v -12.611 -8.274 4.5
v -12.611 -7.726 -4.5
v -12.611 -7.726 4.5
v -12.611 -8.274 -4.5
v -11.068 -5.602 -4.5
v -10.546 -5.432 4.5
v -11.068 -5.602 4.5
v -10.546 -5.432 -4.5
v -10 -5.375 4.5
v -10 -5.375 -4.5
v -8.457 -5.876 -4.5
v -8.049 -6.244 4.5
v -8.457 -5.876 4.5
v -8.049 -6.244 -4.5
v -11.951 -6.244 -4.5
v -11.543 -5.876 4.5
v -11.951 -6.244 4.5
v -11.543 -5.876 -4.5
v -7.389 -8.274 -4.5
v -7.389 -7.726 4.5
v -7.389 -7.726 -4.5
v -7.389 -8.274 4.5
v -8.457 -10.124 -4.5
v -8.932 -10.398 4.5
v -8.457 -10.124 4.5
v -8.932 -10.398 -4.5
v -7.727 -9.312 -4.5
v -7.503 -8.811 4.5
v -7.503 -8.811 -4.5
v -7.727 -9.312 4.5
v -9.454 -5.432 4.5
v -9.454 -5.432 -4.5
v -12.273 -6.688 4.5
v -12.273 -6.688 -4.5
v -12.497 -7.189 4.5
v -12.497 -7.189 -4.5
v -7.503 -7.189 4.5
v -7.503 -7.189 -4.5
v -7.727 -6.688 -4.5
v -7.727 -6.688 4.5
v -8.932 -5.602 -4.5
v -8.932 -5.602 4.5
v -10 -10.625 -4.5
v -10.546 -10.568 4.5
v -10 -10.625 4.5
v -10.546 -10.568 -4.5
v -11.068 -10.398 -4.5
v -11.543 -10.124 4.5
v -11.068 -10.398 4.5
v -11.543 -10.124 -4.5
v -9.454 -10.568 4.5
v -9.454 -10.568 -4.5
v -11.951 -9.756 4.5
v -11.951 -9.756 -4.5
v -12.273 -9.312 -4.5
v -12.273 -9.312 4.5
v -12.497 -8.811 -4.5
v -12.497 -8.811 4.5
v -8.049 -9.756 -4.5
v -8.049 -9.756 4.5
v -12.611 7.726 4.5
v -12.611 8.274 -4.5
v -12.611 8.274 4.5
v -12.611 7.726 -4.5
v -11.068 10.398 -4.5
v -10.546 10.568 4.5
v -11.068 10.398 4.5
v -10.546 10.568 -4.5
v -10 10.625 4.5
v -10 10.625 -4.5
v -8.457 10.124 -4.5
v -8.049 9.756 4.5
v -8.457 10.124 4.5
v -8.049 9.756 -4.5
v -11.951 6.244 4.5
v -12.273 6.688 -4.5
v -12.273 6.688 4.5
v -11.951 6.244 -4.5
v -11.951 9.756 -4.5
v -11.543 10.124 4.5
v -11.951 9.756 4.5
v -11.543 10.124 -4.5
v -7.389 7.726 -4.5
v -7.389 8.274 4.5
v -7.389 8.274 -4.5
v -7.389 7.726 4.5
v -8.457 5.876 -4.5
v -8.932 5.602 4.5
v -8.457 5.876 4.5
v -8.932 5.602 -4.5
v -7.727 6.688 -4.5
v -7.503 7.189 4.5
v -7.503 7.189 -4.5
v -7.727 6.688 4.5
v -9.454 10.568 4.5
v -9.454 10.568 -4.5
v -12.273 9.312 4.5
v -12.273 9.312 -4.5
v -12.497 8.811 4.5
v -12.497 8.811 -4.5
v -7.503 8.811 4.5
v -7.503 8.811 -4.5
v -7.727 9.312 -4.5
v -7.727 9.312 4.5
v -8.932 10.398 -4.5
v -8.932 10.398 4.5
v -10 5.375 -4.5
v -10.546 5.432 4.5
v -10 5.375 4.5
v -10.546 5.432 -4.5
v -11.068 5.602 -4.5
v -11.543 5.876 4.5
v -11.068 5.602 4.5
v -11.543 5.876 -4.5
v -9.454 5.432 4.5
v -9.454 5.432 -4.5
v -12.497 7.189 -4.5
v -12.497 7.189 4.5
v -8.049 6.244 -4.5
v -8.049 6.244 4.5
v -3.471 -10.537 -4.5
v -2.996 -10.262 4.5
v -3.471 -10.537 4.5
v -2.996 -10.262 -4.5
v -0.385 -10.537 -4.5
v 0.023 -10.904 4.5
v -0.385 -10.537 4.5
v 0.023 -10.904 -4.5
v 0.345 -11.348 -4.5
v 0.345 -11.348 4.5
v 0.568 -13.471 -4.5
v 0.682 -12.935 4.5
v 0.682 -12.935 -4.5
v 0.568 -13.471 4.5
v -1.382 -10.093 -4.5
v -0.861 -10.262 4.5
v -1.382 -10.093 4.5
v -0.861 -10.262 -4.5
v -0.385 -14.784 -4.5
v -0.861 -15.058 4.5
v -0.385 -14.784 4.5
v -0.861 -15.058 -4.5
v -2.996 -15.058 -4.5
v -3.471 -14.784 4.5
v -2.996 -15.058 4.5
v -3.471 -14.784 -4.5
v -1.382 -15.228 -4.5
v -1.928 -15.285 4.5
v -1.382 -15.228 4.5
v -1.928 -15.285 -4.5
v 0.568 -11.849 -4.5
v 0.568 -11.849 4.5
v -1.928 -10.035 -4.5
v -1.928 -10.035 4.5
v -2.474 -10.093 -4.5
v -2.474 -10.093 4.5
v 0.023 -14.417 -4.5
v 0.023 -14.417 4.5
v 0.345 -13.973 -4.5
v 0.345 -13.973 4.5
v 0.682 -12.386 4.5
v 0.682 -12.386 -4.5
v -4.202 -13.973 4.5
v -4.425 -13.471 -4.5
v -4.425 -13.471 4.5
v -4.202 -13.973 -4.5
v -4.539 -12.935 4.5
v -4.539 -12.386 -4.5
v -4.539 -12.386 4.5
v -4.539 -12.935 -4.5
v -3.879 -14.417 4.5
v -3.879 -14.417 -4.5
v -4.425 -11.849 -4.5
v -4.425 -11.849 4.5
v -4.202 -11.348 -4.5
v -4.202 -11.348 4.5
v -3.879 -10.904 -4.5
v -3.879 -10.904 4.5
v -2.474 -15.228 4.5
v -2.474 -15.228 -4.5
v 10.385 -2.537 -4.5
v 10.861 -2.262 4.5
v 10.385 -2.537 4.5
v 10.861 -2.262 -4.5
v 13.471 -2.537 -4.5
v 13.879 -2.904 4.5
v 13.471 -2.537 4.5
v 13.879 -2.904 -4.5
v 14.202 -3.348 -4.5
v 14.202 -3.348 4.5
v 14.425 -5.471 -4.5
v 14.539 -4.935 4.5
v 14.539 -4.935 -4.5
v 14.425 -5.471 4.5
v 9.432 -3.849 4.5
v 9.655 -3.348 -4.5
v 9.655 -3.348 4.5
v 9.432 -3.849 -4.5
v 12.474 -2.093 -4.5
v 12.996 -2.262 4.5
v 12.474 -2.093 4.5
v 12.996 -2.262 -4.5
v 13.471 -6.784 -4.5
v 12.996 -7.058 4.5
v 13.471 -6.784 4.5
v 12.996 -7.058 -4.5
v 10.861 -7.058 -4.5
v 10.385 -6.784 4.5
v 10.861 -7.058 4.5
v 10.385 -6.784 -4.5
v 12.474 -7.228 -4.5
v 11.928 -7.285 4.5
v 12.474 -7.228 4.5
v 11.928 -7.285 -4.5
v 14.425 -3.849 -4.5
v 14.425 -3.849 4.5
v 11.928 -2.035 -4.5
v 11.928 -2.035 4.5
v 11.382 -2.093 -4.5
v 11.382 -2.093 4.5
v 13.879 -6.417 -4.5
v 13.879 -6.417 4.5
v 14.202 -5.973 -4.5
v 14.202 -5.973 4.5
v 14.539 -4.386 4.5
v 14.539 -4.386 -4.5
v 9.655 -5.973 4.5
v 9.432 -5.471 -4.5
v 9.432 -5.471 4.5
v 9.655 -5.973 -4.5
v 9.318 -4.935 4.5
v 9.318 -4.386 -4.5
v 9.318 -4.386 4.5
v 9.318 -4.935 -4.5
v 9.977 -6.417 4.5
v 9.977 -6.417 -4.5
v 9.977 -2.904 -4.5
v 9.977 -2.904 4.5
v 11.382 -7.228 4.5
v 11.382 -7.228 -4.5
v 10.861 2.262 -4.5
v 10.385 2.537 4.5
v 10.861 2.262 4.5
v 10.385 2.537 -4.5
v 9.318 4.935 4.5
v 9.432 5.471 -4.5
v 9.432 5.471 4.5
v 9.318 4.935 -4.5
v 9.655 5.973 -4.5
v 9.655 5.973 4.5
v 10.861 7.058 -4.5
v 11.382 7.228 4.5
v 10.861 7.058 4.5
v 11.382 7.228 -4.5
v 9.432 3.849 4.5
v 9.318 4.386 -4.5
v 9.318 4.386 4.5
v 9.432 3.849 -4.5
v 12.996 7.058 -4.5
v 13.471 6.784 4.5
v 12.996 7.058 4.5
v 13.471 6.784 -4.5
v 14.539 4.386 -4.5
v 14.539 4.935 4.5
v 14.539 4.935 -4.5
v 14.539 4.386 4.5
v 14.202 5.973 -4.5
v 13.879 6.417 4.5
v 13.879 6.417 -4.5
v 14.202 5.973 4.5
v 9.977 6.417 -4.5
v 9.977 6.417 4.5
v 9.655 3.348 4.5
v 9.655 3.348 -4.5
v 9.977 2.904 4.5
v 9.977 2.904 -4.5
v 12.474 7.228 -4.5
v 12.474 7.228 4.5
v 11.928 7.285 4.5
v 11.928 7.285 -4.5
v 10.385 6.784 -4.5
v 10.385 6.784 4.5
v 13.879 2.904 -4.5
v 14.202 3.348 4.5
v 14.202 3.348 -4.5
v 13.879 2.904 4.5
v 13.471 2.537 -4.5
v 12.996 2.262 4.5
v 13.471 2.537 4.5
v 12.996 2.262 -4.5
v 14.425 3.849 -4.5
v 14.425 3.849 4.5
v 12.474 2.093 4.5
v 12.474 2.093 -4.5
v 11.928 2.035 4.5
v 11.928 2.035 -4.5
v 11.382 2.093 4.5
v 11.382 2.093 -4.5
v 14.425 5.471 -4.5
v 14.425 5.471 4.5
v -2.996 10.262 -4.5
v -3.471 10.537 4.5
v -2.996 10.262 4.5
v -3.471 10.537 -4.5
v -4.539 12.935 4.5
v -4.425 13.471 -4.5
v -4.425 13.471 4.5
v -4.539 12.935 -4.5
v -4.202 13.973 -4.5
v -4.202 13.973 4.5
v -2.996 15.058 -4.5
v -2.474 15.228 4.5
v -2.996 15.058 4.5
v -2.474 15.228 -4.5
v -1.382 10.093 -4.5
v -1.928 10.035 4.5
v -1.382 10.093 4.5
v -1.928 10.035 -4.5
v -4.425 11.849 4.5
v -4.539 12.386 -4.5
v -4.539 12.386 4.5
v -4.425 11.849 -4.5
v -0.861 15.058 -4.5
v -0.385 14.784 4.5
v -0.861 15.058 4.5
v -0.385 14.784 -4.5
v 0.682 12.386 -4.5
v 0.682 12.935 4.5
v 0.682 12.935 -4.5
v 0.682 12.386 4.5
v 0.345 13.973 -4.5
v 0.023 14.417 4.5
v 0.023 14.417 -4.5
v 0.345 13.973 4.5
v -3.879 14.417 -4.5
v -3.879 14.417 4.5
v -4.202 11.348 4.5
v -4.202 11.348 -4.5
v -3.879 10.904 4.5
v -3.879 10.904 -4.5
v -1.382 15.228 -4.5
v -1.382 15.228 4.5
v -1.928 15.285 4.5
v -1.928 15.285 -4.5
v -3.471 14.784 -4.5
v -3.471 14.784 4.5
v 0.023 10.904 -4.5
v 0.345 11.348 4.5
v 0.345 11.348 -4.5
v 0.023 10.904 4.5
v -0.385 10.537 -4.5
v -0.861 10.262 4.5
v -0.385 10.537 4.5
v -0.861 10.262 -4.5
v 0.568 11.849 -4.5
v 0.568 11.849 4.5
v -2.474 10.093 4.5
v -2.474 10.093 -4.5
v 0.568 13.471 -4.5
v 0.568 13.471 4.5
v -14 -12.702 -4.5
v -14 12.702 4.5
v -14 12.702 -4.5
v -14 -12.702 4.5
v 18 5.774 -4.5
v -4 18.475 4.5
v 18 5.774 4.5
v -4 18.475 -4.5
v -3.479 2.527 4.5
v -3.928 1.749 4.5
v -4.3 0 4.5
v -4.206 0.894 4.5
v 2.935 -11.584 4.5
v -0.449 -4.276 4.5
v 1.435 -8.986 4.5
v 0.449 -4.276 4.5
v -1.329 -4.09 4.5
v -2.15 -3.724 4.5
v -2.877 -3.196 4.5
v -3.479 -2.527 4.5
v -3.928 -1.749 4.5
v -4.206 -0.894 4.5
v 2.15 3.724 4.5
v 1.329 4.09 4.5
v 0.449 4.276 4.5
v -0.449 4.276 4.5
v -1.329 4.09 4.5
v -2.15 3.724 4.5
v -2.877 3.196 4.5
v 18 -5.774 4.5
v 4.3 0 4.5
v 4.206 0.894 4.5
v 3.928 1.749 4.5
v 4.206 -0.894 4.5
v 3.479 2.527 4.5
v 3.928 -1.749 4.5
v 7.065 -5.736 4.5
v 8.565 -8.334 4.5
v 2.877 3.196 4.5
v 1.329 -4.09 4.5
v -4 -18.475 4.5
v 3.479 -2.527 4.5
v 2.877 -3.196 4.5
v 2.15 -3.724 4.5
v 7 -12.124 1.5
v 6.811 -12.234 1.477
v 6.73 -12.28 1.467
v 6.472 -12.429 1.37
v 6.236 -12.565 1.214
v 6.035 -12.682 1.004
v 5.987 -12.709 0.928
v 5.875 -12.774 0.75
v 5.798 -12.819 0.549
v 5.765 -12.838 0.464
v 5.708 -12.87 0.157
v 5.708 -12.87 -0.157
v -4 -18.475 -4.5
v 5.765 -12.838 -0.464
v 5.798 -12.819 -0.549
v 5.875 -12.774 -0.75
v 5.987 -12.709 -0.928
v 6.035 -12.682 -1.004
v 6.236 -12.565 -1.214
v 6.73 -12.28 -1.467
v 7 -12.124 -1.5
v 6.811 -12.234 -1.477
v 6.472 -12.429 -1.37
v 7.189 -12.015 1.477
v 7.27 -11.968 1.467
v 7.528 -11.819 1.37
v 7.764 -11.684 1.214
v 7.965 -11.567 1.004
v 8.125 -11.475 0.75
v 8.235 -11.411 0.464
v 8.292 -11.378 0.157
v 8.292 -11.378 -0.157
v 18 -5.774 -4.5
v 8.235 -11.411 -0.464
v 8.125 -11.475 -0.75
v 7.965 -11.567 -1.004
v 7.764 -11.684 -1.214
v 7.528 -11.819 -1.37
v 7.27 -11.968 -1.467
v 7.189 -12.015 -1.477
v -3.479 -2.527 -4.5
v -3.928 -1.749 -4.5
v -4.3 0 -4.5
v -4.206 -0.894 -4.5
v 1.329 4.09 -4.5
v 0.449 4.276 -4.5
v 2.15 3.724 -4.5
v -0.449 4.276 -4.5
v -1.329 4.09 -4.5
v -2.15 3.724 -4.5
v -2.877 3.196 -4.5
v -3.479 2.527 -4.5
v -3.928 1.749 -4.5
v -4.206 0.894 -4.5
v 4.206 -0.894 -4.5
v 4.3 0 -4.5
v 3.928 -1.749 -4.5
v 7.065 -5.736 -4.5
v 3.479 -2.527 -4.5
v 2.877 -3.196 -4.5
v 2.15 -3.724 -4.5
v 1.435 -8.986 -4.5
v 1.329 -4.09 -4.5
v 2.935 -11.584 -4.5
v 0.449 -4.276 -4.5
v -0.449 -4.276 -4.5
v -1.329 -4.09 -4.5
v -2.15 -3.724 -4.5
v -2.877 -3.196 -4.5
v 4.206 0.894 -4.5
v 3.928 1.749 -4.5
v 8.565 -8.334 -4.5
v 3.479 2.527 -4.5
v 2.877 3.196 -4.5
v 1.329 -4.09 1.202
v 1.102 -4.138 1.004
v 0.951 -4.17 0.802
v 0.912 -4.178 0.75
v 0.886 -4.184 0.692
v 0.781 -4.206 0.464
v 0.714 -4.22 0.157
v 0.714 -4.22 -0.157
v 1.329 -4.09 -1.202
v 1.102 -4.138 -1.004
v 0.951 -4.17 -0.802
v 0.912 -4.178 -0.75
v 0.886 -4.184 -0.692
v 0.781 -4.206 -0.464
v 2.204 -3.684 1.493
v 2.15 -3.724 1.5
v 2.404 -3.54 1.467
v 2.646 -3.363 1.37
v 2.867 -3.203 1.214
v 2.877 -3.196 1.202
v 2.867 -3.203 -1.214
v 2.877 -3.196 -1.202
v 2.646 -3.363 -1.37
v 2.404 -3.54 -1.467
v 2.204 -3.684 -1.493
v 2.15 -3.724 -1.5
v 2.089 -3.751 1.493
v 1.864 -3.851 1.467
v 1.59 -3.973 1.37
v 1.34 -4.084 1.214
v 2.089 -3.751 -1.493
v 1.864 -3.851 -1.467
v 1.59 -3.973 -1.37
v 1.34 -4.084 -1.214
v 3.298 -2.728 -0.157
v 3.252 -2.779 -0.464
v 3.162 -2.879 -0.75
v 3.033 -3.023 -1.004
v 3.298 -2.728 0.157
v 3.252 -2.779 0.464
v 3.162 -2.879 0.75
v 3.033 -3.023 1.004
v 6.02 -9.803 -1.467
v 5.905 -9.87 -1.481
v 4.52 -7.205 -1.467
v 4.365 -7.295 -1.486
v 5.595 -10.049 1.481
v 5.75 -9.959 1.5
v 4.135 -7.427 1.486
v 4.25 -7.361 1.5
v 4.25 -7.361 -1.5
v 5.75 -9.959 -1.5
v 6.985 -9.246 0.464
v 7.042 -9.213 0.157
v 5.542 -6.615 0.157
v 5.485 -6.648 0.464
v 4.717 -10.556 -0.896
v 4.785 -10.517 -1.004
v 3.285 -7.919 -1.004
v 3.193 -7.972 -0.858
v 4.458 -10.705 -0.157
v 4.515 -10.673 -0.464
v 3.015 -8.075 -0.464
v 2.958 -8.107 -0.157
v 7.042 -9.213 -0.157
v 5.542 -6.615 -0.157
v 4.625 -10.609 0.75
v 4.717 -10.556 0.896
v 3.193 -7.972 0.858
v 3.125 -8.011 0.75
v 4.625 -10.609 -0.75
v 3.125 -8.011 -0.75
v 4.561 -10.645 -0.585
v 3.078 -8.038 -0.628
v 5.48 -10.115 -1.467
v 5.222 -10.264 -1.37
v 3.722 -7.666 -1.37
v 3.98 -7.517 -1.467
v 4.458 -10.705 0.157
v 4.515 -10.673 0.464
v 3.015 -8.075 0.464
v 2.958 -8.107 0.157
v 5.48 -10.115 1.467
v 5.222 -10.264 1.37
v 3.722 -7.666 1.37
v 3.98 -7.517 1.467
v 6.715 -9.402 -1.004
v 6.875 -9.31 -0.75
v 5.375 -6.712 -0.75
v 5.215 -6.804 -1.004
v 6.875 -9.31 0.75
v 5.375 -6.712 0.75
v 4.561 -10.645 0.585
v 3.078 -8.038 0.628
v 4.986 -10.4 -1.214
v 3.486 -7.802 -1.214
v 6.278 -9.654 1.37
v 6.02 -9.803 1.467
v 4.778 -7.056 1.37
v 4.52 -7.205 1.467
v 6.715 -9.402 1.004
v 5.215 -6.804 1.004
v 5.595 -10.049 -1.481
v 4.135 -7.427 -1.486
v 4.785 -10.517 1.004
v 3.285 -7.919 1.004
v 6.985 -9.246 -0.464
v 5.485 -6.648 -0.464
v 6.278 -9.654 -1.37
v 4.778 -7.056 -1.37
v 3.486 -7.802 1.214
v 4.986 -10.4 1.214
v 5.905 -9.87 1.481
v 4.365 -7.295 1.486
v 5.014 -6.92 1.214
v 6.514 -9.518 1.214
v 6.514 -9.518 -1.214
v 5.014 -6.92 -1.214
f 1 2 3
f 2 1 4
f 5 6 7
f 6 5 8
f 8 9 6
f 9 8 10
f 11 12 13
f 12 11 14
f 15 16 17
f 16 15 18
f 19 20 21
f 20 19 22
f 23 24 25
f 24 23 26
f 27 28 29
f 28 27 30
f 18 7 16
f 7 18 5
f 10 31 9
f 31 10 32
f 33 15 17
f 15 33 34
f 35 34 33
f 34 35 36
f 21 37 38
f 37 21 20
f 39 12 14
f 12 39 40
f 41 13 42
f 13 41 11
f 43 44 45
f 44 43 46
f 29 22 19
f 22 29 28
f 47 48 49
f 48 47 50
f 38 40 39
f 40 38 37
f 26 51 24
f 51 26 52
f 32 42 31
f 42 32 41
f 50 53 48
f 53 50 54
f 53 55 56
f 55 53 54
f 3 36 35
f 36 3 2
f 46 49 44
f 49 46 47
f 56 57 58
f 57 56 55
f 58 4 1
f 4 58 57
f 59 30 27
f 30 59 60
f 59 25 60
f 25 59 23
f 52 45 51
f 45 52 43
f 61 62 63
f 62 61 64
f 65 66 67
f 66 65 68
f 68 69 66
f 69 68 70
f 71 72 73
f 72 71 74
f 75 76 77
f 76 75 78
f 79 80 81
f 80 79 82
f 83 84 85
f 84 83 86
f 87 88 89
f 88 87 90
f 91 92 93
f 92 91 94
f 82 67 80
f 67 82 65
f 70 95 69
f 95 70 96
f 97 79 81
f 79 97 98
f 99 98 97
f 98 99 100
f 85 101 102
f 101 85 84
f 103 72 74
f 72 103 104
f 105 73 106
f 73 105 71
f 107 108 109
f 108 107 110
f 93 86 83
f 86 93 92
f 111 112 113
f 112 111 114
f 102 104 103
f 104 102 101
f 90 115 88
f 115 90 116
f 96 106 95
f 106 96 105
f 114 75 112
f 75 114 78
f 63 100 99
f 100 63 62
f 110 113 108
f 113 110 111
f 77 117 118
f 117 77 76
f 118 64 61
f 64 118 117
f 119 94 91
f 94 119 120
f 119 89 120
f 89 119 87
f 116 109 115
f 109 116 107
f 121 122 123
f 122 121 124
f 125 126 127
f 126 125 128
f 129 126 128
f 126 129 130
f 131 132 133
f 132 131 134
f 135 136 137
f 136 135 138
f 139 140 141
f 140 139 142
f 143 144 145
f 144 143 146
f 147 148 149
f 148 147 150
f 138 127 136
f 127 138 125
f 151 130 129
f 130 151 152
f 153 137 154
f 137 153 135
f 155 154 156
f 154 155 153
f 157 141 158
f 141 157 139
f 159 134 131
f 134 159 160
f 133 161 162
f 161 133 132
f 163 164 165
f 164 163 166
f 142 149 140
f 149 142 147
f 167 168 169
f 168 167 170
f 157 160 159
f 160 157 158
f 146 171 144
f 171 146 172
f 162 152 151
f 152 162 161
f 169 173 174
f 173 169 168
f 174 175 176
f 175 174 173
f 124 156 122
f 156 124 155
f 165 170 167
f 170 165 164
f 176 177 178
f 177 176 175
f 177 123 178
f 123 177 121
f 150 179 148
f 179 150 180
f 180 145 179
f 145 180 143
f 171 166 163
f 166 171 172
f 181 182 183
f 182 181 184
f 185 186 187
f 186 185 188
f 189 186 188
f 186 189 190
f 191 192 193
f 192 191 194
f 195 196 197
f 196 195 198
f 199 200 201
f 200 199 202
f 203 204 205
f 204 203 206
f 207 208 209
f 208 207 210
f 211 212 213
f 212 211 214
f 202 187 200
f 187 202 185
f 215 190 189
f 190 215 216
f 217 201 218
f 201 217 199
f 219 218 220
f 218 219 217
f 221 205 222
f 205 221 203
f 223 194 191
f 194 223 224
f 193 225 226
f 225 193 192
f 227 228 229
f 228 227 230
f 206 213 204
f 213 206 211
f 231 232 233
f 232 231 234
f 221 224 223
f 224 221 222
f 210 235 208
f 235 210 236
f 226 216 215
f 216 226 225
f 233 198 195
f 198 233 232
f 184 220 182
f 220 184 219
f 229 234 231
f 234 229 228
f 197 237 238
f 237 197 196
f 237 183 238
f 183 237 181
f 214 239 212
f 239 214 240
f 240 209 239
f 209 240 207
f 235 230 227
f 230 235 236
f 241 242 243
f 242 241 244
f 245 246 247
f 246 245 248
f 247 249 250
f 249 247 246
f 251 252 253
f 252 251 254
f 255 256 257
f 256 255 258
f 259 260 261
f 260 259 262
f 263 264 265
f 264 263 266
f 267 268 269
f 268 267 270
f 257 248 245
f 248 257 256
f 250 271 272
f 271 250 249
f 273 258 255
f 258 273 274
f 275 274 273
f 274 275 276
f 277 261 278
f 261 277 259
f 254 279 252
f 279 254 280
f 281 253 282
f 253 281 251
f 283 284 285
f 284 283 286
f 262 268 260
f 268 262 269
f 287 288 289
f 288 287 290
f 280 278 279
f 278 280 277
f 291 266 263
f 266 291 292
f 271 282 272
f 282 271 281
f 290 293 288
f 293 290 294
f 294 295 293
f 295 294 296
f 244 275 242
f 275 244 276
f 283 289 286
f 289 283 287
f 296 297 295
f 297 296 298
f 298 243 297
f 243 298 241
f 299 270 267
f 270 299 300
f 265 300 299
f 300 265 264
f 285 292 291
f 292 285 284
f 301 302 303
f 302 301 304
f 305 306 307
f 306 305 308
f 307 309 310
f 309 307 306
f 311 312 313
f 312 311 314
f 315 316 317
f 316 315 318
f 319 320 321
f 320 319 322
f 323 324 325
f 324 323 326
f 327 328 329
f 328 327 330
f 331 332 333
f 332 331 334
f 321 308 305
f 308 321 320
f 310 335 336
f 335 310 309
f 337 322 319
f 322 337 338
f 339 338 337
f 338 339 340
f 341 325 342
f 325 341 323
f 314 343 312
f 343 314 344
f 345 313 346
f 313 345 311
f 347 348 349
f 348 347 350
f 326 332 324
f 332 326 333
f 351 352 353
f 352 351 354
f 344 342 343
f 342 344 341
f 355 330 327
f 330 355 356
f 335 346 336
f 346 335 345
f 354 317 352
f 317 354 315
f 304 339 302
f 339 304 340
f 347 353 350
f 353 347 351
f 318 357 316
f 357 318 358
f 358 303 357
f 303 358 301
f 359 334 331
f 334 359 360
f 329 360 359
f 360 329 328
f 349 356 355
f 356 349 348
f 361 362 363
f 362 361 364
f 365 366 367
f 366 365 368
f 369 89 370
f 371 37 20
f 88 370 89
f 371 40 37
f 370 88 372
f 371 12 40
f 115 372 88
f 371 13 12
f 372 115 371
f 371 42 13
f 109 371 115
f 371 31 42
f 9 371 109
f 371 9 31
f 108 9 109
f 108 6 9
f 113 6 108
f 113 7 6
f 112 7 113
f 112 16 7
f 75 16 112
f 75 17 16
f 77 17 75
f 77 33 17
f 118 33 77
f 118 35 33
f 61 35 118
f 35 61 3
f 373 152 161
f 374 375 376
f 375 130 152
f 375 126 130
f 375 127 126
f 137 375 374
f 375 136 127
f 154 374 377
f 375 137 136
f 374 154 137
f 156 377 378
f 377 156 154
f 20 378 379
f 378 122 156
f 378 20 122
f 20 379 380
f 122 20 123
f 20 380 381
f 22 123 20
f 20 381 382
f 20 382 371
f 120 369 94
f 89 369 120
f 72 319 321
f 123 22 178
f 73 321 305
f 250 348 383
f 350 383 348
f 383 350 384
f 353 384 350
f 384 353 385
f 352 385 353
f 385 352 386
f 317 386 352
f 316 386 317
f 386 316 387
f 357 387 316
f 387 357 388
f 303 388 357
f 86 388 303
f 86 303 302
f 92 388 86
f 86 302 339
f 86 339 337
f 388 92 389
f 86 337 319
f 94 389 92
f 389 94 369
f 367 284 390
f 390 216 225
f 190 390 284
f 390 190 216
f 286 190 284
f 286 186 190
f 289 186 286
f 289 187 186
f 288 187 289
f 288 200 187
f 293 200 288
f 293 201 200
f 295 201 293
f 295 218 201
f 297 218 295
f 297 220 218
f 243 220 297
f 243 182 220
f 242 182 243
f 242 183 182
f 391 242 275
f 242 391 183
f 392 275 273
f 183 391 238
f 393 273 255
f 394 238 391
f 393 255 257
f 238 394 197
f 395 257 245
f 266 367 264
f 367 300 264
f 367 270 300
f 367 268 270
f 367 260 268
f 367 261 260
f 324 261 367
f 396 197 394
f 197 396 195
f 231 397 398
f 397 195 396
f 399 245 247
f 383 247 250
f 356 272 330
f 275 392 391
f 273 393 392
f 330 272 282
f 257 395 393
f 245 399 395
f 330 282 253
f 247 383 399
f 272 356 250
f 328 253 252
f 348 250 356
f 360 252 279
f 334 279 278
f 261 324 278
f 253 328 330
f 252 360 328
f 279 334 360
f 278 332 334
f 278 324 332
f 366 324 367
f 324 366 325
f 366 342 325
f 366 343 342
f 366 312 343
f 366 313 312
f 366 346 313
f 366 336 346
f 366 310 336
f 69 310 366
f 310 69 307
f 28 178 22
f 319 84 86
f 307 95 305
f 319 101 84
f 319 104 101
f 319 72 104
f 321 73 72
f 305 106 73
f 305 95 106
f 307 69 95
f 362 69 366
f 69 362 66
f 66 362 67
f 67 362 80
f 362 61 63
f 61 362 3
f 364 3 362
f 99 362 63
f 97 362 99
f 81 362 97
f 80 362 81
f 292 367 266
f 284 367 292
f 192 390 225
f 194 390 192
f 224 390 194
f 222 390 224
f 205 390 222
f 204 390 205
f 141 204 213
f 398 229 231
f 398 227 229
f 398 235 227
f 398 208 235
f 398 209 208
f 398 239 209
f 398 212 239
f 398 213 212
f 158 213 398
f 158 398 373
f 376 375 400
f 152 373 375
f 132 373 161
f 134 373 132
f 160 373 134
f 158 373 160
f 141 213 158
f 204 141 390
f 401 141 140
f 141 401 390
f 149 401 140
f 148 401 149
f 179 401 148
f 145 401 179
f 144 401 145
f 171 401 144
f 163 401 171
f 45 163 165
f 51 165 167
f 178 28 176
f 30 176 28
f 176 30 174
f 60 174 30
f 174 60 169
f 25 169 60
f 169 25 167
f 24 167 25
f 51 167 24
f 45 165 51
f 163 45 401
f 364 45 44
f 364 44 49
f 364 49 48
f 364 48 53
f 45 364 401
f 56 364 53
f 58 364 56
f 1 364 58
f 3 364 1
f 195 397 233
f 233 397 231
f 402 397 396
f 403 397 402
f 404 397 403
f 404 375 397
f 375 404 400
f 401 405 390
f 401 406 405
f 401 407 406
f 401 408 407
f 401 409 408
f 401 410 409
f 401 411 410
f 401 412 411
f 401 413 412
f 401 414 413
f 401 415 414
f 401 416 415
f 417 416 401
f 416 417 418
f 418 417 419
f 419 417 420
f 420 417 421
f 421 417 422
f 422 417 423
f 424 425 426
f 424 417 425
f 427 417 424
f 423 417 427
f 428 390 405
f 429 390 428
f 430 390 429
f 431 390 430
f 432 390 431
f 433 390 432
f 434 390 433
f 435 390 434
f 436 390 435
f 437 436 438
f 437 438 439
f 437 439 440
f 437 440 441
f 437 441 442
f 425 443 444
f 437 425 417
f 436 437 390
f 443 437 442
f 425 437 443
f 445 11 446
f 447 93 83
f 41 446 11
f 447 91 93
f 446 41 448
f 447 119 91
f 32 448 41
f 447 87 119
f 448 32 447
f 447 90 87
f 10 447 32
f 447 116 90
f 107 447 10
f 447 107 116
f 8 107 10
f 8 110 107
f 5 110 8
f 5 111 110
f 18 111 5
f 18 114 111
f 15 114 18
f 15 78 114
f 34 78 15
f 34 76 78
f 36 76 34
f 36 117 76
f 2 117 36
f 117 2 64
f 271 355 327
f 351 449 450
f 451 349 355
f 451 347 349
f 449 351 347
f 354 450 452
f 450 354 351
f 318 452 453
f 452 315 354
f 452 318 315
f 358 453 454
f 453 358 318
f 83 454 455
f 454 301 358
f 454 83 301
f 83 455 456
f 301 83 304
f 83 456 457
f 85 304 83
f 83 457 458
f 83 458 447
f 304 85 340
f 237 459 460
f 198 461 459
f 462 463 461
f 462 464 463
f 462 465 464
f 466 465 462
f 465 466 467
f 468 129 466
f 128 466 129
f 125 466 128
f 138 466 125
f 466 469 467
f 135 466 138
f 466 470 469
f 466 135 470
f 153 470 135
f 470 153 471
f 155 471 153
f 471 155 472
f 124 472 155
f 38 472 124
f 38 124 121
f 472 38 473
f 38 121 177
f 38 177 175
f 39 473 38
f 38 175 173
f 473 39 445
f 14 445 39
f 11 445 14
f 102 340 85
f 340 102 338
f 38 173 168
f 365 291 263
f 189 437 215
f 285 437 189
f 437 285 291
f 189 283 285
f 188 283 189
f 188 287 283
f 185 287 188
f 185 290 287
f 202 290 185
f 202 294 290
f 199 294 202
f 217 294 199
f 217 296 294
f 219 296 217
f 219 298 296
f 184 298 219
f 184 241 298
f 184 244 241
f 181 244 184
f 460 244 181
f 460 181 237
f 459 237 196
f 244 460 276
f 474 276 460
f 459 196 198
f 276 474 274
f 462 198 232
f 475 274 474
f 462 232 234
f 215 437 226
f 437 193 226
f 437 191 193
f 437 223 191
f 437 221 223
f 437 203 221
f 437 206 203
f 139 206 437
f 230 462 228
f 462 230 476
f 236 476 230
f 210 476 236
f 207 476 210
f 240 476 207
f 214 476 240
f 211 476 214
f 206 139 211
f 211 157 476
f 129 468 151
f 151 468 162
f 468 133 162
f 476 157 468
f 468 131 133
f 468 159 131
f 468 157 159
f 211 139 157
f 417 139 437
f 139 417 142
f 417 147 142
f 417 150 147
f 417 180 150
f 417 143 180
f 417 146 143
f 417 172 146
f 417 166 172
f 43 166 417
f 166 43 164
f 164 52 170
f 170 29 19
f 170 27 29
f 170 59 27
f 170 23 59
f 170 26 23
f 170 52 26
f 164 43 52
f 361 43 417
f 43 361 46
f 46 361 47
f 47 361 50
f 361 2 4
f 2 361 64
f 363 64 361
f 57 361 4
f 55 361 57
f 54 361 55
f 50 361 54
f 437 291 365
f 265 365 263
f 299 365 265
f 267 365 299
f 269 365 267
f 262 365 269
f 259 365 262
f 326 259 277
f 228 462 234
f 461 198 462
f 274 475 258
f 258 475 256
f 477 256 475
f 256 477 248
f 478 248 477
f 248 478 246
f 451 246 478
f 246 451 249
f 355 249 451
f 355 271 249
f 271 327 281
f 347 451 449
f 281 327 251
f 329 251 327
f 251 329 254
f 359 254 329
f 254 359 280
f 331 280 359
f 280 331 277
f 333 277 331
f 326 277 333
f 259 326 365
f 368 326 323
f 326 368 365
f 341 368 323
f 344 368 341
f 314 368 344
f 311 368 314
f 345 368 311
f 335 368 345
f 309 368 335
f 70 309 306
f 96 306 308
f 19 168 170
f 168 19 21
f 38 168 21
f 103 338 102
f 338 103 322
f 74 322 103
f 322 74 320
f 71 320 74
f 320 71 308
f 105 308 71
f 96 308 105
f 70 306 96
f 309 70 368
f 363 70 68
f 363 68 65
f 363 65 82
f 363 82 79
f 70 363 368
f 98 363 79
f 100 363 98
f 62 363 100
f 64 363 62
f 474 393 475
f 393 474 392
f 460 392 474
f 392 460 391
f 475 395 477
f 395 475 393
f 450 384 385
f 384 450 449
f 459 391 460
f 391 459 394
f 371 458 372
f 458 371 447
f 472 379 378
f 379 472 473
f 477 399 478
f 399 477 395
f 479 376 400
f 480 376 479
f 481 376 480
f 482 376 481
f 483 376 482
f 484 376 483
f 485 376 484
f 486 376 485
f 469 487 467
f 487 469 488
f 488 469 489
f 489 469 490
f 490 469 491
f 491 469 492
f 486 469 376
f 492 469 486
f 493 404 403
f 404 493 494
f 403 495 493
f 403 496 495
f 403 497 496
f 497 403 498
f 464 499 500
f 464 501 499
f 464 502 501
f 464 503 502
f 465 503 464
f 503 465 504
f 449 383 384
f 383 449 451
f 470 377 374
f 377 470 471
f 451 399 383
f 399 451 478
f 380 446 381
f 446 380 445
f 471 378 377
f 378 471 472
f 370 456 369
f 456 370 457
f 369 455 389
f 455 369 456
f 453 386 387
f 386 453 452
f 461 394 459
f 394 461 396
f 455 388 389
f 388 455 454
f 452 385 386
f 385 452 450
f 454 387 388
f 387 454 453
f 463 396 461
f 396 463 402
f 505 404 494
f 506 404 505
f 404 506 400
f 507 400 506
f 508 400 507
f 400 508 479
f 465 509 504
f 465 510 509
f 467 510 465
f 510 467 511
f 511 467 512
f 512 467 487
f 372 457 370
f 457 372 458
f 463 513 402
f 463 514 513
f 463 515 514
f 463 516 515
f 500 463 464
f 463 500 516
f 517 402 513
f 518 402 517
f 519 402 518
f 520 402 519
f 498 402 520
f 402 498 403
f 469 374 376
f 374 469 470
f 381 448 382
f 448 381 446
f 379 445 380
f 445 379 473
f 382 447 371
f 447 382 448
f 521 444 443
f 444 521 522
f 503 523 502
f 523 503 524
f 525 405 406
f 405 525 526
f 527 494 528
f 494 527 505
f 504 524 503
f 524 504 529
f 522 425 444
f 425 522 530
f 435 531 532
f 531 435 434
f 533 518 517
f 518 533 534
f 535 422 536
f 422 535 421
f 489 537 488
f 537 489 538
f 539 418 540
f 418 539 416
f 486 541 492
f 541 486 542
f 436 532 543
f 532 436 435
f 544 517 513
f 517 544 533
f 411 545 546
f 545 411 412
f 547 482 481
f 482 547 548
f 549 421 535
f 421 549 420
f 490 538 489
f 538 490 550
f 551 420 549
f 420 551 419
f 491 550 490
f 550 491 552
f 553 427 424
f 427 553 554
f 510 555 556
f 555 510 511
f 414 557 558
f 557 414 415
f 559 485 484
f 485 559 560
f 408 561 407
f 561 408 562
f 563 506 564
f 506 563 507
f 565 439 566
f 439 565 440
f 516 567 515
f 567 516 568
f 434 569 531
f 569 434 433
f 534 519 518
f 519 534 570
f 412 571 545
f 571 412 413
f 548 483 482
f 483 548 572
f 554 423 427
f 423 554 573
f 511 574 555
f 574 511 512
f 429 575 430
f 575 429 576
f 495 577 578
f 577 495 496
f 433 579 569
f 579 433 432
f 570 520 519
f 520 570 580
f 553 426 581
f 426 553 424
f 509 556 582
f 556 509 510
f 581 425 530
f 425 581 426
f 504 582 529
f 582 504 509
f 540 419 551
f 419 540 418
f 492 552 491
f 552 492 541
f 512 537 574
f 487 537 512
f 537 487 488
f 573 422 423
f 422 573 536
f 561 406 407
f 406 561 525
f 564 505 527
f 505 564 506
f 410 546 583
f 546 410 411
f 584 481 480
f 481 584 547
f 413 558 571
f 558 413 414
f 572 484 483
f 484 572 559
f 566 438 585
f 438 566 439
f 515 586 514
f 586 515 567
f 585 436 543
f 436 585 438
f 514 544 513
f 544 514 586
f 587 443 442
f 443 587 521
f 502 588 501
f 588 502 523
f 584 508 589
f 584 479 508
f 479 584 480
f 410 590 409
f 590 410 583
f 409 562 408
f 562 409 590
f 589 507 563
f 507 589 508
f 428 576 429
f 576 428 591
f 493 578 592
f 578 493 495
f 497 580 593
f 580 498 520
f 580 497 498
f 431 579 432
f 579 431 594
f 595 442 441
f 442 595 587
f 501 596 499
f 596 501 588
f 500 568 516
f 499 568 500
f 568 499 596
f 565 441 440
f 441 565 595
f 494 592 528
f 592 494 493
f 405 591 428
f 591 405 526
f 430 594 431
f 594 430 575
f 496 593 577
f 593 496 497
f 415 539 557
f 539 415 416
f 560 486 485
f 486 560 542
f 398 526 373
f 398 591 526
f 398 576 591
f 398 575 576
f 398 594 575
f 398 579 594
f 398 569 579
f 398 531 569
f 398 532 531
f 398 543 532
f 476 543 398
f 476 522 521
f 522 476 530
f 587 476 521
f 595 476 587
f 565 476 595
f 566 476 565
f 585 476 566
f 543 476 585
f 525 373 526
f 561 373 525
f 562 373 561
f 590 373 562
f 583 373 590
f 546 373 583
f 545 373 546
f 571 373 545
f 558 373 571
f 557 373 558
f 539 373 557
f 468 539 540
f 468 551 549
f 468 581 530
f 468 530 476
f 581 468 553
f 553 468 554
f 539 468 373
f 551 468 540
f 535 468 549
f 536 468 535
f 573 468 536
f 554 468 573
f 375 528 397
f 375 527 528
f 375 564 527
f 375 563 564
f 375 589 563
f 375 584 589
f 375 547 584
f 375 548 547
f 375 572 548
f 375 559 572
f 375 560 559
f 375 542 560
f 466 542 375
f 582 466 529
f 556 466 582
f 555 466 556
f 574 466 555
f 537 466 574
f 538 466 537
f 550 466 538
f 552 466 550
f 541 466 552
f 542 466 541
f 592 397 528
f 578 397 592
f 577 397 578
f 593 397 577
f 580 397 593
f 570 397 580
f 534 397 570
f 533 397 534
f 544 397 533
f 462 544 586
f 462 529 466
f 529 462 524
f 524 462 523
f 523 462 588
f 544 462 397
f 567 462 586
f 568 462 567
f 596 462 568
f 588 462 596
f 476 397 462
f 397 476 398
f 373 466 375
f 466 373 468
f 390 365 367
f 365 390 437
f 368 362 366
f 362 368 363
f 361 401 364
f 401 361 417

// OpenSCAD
beam_width    = 8;
hole_diameter = 5.25;
hole_radius   = hole_diameter / 2;

clipping_distance = 26;

difference(){
  cylinder(r=56/2, h=9, $fn=3, center=true);

  translate([0,0,-10])
  cylinder(r=4.3, h=20, $fn=30);


  rotate([60,90,0])
  translate([0,0,0])
  cylinder(r=1.5, h=20, $fn=30);

  rotate(-60)
  translate([10,0,0])
  cube([3,6.5,30], center=true);

  translate([clipping_distance,0,0])
  cube([16,16,10], center=true);

  rotate(120)
  translate([clipping_distance,0,0])
  cube([16,16,10], center=true);

  rotate(240)
  translate([clipping_distance,0,0])
  cube([16,16,10], center=true);

  

  rotate(90)
  translate([-12,6,0])
  beam(3);


  rotate(30)
  translate([-12,-14,0])
  beam(3);

  rotate(150)
  translate([-12,-14,0])
  beam(3);

}


module beam(number_of_holes) {
    beam_length = number_of_holes * beam_width;
		for (x=[4 : 16 : beam_length]) {
			//rotate([90,0,0])
			translate([x,beam_width/2,-10])
			cylinder(r=hole_radius, h=20, $fn=30);
         }
}     
